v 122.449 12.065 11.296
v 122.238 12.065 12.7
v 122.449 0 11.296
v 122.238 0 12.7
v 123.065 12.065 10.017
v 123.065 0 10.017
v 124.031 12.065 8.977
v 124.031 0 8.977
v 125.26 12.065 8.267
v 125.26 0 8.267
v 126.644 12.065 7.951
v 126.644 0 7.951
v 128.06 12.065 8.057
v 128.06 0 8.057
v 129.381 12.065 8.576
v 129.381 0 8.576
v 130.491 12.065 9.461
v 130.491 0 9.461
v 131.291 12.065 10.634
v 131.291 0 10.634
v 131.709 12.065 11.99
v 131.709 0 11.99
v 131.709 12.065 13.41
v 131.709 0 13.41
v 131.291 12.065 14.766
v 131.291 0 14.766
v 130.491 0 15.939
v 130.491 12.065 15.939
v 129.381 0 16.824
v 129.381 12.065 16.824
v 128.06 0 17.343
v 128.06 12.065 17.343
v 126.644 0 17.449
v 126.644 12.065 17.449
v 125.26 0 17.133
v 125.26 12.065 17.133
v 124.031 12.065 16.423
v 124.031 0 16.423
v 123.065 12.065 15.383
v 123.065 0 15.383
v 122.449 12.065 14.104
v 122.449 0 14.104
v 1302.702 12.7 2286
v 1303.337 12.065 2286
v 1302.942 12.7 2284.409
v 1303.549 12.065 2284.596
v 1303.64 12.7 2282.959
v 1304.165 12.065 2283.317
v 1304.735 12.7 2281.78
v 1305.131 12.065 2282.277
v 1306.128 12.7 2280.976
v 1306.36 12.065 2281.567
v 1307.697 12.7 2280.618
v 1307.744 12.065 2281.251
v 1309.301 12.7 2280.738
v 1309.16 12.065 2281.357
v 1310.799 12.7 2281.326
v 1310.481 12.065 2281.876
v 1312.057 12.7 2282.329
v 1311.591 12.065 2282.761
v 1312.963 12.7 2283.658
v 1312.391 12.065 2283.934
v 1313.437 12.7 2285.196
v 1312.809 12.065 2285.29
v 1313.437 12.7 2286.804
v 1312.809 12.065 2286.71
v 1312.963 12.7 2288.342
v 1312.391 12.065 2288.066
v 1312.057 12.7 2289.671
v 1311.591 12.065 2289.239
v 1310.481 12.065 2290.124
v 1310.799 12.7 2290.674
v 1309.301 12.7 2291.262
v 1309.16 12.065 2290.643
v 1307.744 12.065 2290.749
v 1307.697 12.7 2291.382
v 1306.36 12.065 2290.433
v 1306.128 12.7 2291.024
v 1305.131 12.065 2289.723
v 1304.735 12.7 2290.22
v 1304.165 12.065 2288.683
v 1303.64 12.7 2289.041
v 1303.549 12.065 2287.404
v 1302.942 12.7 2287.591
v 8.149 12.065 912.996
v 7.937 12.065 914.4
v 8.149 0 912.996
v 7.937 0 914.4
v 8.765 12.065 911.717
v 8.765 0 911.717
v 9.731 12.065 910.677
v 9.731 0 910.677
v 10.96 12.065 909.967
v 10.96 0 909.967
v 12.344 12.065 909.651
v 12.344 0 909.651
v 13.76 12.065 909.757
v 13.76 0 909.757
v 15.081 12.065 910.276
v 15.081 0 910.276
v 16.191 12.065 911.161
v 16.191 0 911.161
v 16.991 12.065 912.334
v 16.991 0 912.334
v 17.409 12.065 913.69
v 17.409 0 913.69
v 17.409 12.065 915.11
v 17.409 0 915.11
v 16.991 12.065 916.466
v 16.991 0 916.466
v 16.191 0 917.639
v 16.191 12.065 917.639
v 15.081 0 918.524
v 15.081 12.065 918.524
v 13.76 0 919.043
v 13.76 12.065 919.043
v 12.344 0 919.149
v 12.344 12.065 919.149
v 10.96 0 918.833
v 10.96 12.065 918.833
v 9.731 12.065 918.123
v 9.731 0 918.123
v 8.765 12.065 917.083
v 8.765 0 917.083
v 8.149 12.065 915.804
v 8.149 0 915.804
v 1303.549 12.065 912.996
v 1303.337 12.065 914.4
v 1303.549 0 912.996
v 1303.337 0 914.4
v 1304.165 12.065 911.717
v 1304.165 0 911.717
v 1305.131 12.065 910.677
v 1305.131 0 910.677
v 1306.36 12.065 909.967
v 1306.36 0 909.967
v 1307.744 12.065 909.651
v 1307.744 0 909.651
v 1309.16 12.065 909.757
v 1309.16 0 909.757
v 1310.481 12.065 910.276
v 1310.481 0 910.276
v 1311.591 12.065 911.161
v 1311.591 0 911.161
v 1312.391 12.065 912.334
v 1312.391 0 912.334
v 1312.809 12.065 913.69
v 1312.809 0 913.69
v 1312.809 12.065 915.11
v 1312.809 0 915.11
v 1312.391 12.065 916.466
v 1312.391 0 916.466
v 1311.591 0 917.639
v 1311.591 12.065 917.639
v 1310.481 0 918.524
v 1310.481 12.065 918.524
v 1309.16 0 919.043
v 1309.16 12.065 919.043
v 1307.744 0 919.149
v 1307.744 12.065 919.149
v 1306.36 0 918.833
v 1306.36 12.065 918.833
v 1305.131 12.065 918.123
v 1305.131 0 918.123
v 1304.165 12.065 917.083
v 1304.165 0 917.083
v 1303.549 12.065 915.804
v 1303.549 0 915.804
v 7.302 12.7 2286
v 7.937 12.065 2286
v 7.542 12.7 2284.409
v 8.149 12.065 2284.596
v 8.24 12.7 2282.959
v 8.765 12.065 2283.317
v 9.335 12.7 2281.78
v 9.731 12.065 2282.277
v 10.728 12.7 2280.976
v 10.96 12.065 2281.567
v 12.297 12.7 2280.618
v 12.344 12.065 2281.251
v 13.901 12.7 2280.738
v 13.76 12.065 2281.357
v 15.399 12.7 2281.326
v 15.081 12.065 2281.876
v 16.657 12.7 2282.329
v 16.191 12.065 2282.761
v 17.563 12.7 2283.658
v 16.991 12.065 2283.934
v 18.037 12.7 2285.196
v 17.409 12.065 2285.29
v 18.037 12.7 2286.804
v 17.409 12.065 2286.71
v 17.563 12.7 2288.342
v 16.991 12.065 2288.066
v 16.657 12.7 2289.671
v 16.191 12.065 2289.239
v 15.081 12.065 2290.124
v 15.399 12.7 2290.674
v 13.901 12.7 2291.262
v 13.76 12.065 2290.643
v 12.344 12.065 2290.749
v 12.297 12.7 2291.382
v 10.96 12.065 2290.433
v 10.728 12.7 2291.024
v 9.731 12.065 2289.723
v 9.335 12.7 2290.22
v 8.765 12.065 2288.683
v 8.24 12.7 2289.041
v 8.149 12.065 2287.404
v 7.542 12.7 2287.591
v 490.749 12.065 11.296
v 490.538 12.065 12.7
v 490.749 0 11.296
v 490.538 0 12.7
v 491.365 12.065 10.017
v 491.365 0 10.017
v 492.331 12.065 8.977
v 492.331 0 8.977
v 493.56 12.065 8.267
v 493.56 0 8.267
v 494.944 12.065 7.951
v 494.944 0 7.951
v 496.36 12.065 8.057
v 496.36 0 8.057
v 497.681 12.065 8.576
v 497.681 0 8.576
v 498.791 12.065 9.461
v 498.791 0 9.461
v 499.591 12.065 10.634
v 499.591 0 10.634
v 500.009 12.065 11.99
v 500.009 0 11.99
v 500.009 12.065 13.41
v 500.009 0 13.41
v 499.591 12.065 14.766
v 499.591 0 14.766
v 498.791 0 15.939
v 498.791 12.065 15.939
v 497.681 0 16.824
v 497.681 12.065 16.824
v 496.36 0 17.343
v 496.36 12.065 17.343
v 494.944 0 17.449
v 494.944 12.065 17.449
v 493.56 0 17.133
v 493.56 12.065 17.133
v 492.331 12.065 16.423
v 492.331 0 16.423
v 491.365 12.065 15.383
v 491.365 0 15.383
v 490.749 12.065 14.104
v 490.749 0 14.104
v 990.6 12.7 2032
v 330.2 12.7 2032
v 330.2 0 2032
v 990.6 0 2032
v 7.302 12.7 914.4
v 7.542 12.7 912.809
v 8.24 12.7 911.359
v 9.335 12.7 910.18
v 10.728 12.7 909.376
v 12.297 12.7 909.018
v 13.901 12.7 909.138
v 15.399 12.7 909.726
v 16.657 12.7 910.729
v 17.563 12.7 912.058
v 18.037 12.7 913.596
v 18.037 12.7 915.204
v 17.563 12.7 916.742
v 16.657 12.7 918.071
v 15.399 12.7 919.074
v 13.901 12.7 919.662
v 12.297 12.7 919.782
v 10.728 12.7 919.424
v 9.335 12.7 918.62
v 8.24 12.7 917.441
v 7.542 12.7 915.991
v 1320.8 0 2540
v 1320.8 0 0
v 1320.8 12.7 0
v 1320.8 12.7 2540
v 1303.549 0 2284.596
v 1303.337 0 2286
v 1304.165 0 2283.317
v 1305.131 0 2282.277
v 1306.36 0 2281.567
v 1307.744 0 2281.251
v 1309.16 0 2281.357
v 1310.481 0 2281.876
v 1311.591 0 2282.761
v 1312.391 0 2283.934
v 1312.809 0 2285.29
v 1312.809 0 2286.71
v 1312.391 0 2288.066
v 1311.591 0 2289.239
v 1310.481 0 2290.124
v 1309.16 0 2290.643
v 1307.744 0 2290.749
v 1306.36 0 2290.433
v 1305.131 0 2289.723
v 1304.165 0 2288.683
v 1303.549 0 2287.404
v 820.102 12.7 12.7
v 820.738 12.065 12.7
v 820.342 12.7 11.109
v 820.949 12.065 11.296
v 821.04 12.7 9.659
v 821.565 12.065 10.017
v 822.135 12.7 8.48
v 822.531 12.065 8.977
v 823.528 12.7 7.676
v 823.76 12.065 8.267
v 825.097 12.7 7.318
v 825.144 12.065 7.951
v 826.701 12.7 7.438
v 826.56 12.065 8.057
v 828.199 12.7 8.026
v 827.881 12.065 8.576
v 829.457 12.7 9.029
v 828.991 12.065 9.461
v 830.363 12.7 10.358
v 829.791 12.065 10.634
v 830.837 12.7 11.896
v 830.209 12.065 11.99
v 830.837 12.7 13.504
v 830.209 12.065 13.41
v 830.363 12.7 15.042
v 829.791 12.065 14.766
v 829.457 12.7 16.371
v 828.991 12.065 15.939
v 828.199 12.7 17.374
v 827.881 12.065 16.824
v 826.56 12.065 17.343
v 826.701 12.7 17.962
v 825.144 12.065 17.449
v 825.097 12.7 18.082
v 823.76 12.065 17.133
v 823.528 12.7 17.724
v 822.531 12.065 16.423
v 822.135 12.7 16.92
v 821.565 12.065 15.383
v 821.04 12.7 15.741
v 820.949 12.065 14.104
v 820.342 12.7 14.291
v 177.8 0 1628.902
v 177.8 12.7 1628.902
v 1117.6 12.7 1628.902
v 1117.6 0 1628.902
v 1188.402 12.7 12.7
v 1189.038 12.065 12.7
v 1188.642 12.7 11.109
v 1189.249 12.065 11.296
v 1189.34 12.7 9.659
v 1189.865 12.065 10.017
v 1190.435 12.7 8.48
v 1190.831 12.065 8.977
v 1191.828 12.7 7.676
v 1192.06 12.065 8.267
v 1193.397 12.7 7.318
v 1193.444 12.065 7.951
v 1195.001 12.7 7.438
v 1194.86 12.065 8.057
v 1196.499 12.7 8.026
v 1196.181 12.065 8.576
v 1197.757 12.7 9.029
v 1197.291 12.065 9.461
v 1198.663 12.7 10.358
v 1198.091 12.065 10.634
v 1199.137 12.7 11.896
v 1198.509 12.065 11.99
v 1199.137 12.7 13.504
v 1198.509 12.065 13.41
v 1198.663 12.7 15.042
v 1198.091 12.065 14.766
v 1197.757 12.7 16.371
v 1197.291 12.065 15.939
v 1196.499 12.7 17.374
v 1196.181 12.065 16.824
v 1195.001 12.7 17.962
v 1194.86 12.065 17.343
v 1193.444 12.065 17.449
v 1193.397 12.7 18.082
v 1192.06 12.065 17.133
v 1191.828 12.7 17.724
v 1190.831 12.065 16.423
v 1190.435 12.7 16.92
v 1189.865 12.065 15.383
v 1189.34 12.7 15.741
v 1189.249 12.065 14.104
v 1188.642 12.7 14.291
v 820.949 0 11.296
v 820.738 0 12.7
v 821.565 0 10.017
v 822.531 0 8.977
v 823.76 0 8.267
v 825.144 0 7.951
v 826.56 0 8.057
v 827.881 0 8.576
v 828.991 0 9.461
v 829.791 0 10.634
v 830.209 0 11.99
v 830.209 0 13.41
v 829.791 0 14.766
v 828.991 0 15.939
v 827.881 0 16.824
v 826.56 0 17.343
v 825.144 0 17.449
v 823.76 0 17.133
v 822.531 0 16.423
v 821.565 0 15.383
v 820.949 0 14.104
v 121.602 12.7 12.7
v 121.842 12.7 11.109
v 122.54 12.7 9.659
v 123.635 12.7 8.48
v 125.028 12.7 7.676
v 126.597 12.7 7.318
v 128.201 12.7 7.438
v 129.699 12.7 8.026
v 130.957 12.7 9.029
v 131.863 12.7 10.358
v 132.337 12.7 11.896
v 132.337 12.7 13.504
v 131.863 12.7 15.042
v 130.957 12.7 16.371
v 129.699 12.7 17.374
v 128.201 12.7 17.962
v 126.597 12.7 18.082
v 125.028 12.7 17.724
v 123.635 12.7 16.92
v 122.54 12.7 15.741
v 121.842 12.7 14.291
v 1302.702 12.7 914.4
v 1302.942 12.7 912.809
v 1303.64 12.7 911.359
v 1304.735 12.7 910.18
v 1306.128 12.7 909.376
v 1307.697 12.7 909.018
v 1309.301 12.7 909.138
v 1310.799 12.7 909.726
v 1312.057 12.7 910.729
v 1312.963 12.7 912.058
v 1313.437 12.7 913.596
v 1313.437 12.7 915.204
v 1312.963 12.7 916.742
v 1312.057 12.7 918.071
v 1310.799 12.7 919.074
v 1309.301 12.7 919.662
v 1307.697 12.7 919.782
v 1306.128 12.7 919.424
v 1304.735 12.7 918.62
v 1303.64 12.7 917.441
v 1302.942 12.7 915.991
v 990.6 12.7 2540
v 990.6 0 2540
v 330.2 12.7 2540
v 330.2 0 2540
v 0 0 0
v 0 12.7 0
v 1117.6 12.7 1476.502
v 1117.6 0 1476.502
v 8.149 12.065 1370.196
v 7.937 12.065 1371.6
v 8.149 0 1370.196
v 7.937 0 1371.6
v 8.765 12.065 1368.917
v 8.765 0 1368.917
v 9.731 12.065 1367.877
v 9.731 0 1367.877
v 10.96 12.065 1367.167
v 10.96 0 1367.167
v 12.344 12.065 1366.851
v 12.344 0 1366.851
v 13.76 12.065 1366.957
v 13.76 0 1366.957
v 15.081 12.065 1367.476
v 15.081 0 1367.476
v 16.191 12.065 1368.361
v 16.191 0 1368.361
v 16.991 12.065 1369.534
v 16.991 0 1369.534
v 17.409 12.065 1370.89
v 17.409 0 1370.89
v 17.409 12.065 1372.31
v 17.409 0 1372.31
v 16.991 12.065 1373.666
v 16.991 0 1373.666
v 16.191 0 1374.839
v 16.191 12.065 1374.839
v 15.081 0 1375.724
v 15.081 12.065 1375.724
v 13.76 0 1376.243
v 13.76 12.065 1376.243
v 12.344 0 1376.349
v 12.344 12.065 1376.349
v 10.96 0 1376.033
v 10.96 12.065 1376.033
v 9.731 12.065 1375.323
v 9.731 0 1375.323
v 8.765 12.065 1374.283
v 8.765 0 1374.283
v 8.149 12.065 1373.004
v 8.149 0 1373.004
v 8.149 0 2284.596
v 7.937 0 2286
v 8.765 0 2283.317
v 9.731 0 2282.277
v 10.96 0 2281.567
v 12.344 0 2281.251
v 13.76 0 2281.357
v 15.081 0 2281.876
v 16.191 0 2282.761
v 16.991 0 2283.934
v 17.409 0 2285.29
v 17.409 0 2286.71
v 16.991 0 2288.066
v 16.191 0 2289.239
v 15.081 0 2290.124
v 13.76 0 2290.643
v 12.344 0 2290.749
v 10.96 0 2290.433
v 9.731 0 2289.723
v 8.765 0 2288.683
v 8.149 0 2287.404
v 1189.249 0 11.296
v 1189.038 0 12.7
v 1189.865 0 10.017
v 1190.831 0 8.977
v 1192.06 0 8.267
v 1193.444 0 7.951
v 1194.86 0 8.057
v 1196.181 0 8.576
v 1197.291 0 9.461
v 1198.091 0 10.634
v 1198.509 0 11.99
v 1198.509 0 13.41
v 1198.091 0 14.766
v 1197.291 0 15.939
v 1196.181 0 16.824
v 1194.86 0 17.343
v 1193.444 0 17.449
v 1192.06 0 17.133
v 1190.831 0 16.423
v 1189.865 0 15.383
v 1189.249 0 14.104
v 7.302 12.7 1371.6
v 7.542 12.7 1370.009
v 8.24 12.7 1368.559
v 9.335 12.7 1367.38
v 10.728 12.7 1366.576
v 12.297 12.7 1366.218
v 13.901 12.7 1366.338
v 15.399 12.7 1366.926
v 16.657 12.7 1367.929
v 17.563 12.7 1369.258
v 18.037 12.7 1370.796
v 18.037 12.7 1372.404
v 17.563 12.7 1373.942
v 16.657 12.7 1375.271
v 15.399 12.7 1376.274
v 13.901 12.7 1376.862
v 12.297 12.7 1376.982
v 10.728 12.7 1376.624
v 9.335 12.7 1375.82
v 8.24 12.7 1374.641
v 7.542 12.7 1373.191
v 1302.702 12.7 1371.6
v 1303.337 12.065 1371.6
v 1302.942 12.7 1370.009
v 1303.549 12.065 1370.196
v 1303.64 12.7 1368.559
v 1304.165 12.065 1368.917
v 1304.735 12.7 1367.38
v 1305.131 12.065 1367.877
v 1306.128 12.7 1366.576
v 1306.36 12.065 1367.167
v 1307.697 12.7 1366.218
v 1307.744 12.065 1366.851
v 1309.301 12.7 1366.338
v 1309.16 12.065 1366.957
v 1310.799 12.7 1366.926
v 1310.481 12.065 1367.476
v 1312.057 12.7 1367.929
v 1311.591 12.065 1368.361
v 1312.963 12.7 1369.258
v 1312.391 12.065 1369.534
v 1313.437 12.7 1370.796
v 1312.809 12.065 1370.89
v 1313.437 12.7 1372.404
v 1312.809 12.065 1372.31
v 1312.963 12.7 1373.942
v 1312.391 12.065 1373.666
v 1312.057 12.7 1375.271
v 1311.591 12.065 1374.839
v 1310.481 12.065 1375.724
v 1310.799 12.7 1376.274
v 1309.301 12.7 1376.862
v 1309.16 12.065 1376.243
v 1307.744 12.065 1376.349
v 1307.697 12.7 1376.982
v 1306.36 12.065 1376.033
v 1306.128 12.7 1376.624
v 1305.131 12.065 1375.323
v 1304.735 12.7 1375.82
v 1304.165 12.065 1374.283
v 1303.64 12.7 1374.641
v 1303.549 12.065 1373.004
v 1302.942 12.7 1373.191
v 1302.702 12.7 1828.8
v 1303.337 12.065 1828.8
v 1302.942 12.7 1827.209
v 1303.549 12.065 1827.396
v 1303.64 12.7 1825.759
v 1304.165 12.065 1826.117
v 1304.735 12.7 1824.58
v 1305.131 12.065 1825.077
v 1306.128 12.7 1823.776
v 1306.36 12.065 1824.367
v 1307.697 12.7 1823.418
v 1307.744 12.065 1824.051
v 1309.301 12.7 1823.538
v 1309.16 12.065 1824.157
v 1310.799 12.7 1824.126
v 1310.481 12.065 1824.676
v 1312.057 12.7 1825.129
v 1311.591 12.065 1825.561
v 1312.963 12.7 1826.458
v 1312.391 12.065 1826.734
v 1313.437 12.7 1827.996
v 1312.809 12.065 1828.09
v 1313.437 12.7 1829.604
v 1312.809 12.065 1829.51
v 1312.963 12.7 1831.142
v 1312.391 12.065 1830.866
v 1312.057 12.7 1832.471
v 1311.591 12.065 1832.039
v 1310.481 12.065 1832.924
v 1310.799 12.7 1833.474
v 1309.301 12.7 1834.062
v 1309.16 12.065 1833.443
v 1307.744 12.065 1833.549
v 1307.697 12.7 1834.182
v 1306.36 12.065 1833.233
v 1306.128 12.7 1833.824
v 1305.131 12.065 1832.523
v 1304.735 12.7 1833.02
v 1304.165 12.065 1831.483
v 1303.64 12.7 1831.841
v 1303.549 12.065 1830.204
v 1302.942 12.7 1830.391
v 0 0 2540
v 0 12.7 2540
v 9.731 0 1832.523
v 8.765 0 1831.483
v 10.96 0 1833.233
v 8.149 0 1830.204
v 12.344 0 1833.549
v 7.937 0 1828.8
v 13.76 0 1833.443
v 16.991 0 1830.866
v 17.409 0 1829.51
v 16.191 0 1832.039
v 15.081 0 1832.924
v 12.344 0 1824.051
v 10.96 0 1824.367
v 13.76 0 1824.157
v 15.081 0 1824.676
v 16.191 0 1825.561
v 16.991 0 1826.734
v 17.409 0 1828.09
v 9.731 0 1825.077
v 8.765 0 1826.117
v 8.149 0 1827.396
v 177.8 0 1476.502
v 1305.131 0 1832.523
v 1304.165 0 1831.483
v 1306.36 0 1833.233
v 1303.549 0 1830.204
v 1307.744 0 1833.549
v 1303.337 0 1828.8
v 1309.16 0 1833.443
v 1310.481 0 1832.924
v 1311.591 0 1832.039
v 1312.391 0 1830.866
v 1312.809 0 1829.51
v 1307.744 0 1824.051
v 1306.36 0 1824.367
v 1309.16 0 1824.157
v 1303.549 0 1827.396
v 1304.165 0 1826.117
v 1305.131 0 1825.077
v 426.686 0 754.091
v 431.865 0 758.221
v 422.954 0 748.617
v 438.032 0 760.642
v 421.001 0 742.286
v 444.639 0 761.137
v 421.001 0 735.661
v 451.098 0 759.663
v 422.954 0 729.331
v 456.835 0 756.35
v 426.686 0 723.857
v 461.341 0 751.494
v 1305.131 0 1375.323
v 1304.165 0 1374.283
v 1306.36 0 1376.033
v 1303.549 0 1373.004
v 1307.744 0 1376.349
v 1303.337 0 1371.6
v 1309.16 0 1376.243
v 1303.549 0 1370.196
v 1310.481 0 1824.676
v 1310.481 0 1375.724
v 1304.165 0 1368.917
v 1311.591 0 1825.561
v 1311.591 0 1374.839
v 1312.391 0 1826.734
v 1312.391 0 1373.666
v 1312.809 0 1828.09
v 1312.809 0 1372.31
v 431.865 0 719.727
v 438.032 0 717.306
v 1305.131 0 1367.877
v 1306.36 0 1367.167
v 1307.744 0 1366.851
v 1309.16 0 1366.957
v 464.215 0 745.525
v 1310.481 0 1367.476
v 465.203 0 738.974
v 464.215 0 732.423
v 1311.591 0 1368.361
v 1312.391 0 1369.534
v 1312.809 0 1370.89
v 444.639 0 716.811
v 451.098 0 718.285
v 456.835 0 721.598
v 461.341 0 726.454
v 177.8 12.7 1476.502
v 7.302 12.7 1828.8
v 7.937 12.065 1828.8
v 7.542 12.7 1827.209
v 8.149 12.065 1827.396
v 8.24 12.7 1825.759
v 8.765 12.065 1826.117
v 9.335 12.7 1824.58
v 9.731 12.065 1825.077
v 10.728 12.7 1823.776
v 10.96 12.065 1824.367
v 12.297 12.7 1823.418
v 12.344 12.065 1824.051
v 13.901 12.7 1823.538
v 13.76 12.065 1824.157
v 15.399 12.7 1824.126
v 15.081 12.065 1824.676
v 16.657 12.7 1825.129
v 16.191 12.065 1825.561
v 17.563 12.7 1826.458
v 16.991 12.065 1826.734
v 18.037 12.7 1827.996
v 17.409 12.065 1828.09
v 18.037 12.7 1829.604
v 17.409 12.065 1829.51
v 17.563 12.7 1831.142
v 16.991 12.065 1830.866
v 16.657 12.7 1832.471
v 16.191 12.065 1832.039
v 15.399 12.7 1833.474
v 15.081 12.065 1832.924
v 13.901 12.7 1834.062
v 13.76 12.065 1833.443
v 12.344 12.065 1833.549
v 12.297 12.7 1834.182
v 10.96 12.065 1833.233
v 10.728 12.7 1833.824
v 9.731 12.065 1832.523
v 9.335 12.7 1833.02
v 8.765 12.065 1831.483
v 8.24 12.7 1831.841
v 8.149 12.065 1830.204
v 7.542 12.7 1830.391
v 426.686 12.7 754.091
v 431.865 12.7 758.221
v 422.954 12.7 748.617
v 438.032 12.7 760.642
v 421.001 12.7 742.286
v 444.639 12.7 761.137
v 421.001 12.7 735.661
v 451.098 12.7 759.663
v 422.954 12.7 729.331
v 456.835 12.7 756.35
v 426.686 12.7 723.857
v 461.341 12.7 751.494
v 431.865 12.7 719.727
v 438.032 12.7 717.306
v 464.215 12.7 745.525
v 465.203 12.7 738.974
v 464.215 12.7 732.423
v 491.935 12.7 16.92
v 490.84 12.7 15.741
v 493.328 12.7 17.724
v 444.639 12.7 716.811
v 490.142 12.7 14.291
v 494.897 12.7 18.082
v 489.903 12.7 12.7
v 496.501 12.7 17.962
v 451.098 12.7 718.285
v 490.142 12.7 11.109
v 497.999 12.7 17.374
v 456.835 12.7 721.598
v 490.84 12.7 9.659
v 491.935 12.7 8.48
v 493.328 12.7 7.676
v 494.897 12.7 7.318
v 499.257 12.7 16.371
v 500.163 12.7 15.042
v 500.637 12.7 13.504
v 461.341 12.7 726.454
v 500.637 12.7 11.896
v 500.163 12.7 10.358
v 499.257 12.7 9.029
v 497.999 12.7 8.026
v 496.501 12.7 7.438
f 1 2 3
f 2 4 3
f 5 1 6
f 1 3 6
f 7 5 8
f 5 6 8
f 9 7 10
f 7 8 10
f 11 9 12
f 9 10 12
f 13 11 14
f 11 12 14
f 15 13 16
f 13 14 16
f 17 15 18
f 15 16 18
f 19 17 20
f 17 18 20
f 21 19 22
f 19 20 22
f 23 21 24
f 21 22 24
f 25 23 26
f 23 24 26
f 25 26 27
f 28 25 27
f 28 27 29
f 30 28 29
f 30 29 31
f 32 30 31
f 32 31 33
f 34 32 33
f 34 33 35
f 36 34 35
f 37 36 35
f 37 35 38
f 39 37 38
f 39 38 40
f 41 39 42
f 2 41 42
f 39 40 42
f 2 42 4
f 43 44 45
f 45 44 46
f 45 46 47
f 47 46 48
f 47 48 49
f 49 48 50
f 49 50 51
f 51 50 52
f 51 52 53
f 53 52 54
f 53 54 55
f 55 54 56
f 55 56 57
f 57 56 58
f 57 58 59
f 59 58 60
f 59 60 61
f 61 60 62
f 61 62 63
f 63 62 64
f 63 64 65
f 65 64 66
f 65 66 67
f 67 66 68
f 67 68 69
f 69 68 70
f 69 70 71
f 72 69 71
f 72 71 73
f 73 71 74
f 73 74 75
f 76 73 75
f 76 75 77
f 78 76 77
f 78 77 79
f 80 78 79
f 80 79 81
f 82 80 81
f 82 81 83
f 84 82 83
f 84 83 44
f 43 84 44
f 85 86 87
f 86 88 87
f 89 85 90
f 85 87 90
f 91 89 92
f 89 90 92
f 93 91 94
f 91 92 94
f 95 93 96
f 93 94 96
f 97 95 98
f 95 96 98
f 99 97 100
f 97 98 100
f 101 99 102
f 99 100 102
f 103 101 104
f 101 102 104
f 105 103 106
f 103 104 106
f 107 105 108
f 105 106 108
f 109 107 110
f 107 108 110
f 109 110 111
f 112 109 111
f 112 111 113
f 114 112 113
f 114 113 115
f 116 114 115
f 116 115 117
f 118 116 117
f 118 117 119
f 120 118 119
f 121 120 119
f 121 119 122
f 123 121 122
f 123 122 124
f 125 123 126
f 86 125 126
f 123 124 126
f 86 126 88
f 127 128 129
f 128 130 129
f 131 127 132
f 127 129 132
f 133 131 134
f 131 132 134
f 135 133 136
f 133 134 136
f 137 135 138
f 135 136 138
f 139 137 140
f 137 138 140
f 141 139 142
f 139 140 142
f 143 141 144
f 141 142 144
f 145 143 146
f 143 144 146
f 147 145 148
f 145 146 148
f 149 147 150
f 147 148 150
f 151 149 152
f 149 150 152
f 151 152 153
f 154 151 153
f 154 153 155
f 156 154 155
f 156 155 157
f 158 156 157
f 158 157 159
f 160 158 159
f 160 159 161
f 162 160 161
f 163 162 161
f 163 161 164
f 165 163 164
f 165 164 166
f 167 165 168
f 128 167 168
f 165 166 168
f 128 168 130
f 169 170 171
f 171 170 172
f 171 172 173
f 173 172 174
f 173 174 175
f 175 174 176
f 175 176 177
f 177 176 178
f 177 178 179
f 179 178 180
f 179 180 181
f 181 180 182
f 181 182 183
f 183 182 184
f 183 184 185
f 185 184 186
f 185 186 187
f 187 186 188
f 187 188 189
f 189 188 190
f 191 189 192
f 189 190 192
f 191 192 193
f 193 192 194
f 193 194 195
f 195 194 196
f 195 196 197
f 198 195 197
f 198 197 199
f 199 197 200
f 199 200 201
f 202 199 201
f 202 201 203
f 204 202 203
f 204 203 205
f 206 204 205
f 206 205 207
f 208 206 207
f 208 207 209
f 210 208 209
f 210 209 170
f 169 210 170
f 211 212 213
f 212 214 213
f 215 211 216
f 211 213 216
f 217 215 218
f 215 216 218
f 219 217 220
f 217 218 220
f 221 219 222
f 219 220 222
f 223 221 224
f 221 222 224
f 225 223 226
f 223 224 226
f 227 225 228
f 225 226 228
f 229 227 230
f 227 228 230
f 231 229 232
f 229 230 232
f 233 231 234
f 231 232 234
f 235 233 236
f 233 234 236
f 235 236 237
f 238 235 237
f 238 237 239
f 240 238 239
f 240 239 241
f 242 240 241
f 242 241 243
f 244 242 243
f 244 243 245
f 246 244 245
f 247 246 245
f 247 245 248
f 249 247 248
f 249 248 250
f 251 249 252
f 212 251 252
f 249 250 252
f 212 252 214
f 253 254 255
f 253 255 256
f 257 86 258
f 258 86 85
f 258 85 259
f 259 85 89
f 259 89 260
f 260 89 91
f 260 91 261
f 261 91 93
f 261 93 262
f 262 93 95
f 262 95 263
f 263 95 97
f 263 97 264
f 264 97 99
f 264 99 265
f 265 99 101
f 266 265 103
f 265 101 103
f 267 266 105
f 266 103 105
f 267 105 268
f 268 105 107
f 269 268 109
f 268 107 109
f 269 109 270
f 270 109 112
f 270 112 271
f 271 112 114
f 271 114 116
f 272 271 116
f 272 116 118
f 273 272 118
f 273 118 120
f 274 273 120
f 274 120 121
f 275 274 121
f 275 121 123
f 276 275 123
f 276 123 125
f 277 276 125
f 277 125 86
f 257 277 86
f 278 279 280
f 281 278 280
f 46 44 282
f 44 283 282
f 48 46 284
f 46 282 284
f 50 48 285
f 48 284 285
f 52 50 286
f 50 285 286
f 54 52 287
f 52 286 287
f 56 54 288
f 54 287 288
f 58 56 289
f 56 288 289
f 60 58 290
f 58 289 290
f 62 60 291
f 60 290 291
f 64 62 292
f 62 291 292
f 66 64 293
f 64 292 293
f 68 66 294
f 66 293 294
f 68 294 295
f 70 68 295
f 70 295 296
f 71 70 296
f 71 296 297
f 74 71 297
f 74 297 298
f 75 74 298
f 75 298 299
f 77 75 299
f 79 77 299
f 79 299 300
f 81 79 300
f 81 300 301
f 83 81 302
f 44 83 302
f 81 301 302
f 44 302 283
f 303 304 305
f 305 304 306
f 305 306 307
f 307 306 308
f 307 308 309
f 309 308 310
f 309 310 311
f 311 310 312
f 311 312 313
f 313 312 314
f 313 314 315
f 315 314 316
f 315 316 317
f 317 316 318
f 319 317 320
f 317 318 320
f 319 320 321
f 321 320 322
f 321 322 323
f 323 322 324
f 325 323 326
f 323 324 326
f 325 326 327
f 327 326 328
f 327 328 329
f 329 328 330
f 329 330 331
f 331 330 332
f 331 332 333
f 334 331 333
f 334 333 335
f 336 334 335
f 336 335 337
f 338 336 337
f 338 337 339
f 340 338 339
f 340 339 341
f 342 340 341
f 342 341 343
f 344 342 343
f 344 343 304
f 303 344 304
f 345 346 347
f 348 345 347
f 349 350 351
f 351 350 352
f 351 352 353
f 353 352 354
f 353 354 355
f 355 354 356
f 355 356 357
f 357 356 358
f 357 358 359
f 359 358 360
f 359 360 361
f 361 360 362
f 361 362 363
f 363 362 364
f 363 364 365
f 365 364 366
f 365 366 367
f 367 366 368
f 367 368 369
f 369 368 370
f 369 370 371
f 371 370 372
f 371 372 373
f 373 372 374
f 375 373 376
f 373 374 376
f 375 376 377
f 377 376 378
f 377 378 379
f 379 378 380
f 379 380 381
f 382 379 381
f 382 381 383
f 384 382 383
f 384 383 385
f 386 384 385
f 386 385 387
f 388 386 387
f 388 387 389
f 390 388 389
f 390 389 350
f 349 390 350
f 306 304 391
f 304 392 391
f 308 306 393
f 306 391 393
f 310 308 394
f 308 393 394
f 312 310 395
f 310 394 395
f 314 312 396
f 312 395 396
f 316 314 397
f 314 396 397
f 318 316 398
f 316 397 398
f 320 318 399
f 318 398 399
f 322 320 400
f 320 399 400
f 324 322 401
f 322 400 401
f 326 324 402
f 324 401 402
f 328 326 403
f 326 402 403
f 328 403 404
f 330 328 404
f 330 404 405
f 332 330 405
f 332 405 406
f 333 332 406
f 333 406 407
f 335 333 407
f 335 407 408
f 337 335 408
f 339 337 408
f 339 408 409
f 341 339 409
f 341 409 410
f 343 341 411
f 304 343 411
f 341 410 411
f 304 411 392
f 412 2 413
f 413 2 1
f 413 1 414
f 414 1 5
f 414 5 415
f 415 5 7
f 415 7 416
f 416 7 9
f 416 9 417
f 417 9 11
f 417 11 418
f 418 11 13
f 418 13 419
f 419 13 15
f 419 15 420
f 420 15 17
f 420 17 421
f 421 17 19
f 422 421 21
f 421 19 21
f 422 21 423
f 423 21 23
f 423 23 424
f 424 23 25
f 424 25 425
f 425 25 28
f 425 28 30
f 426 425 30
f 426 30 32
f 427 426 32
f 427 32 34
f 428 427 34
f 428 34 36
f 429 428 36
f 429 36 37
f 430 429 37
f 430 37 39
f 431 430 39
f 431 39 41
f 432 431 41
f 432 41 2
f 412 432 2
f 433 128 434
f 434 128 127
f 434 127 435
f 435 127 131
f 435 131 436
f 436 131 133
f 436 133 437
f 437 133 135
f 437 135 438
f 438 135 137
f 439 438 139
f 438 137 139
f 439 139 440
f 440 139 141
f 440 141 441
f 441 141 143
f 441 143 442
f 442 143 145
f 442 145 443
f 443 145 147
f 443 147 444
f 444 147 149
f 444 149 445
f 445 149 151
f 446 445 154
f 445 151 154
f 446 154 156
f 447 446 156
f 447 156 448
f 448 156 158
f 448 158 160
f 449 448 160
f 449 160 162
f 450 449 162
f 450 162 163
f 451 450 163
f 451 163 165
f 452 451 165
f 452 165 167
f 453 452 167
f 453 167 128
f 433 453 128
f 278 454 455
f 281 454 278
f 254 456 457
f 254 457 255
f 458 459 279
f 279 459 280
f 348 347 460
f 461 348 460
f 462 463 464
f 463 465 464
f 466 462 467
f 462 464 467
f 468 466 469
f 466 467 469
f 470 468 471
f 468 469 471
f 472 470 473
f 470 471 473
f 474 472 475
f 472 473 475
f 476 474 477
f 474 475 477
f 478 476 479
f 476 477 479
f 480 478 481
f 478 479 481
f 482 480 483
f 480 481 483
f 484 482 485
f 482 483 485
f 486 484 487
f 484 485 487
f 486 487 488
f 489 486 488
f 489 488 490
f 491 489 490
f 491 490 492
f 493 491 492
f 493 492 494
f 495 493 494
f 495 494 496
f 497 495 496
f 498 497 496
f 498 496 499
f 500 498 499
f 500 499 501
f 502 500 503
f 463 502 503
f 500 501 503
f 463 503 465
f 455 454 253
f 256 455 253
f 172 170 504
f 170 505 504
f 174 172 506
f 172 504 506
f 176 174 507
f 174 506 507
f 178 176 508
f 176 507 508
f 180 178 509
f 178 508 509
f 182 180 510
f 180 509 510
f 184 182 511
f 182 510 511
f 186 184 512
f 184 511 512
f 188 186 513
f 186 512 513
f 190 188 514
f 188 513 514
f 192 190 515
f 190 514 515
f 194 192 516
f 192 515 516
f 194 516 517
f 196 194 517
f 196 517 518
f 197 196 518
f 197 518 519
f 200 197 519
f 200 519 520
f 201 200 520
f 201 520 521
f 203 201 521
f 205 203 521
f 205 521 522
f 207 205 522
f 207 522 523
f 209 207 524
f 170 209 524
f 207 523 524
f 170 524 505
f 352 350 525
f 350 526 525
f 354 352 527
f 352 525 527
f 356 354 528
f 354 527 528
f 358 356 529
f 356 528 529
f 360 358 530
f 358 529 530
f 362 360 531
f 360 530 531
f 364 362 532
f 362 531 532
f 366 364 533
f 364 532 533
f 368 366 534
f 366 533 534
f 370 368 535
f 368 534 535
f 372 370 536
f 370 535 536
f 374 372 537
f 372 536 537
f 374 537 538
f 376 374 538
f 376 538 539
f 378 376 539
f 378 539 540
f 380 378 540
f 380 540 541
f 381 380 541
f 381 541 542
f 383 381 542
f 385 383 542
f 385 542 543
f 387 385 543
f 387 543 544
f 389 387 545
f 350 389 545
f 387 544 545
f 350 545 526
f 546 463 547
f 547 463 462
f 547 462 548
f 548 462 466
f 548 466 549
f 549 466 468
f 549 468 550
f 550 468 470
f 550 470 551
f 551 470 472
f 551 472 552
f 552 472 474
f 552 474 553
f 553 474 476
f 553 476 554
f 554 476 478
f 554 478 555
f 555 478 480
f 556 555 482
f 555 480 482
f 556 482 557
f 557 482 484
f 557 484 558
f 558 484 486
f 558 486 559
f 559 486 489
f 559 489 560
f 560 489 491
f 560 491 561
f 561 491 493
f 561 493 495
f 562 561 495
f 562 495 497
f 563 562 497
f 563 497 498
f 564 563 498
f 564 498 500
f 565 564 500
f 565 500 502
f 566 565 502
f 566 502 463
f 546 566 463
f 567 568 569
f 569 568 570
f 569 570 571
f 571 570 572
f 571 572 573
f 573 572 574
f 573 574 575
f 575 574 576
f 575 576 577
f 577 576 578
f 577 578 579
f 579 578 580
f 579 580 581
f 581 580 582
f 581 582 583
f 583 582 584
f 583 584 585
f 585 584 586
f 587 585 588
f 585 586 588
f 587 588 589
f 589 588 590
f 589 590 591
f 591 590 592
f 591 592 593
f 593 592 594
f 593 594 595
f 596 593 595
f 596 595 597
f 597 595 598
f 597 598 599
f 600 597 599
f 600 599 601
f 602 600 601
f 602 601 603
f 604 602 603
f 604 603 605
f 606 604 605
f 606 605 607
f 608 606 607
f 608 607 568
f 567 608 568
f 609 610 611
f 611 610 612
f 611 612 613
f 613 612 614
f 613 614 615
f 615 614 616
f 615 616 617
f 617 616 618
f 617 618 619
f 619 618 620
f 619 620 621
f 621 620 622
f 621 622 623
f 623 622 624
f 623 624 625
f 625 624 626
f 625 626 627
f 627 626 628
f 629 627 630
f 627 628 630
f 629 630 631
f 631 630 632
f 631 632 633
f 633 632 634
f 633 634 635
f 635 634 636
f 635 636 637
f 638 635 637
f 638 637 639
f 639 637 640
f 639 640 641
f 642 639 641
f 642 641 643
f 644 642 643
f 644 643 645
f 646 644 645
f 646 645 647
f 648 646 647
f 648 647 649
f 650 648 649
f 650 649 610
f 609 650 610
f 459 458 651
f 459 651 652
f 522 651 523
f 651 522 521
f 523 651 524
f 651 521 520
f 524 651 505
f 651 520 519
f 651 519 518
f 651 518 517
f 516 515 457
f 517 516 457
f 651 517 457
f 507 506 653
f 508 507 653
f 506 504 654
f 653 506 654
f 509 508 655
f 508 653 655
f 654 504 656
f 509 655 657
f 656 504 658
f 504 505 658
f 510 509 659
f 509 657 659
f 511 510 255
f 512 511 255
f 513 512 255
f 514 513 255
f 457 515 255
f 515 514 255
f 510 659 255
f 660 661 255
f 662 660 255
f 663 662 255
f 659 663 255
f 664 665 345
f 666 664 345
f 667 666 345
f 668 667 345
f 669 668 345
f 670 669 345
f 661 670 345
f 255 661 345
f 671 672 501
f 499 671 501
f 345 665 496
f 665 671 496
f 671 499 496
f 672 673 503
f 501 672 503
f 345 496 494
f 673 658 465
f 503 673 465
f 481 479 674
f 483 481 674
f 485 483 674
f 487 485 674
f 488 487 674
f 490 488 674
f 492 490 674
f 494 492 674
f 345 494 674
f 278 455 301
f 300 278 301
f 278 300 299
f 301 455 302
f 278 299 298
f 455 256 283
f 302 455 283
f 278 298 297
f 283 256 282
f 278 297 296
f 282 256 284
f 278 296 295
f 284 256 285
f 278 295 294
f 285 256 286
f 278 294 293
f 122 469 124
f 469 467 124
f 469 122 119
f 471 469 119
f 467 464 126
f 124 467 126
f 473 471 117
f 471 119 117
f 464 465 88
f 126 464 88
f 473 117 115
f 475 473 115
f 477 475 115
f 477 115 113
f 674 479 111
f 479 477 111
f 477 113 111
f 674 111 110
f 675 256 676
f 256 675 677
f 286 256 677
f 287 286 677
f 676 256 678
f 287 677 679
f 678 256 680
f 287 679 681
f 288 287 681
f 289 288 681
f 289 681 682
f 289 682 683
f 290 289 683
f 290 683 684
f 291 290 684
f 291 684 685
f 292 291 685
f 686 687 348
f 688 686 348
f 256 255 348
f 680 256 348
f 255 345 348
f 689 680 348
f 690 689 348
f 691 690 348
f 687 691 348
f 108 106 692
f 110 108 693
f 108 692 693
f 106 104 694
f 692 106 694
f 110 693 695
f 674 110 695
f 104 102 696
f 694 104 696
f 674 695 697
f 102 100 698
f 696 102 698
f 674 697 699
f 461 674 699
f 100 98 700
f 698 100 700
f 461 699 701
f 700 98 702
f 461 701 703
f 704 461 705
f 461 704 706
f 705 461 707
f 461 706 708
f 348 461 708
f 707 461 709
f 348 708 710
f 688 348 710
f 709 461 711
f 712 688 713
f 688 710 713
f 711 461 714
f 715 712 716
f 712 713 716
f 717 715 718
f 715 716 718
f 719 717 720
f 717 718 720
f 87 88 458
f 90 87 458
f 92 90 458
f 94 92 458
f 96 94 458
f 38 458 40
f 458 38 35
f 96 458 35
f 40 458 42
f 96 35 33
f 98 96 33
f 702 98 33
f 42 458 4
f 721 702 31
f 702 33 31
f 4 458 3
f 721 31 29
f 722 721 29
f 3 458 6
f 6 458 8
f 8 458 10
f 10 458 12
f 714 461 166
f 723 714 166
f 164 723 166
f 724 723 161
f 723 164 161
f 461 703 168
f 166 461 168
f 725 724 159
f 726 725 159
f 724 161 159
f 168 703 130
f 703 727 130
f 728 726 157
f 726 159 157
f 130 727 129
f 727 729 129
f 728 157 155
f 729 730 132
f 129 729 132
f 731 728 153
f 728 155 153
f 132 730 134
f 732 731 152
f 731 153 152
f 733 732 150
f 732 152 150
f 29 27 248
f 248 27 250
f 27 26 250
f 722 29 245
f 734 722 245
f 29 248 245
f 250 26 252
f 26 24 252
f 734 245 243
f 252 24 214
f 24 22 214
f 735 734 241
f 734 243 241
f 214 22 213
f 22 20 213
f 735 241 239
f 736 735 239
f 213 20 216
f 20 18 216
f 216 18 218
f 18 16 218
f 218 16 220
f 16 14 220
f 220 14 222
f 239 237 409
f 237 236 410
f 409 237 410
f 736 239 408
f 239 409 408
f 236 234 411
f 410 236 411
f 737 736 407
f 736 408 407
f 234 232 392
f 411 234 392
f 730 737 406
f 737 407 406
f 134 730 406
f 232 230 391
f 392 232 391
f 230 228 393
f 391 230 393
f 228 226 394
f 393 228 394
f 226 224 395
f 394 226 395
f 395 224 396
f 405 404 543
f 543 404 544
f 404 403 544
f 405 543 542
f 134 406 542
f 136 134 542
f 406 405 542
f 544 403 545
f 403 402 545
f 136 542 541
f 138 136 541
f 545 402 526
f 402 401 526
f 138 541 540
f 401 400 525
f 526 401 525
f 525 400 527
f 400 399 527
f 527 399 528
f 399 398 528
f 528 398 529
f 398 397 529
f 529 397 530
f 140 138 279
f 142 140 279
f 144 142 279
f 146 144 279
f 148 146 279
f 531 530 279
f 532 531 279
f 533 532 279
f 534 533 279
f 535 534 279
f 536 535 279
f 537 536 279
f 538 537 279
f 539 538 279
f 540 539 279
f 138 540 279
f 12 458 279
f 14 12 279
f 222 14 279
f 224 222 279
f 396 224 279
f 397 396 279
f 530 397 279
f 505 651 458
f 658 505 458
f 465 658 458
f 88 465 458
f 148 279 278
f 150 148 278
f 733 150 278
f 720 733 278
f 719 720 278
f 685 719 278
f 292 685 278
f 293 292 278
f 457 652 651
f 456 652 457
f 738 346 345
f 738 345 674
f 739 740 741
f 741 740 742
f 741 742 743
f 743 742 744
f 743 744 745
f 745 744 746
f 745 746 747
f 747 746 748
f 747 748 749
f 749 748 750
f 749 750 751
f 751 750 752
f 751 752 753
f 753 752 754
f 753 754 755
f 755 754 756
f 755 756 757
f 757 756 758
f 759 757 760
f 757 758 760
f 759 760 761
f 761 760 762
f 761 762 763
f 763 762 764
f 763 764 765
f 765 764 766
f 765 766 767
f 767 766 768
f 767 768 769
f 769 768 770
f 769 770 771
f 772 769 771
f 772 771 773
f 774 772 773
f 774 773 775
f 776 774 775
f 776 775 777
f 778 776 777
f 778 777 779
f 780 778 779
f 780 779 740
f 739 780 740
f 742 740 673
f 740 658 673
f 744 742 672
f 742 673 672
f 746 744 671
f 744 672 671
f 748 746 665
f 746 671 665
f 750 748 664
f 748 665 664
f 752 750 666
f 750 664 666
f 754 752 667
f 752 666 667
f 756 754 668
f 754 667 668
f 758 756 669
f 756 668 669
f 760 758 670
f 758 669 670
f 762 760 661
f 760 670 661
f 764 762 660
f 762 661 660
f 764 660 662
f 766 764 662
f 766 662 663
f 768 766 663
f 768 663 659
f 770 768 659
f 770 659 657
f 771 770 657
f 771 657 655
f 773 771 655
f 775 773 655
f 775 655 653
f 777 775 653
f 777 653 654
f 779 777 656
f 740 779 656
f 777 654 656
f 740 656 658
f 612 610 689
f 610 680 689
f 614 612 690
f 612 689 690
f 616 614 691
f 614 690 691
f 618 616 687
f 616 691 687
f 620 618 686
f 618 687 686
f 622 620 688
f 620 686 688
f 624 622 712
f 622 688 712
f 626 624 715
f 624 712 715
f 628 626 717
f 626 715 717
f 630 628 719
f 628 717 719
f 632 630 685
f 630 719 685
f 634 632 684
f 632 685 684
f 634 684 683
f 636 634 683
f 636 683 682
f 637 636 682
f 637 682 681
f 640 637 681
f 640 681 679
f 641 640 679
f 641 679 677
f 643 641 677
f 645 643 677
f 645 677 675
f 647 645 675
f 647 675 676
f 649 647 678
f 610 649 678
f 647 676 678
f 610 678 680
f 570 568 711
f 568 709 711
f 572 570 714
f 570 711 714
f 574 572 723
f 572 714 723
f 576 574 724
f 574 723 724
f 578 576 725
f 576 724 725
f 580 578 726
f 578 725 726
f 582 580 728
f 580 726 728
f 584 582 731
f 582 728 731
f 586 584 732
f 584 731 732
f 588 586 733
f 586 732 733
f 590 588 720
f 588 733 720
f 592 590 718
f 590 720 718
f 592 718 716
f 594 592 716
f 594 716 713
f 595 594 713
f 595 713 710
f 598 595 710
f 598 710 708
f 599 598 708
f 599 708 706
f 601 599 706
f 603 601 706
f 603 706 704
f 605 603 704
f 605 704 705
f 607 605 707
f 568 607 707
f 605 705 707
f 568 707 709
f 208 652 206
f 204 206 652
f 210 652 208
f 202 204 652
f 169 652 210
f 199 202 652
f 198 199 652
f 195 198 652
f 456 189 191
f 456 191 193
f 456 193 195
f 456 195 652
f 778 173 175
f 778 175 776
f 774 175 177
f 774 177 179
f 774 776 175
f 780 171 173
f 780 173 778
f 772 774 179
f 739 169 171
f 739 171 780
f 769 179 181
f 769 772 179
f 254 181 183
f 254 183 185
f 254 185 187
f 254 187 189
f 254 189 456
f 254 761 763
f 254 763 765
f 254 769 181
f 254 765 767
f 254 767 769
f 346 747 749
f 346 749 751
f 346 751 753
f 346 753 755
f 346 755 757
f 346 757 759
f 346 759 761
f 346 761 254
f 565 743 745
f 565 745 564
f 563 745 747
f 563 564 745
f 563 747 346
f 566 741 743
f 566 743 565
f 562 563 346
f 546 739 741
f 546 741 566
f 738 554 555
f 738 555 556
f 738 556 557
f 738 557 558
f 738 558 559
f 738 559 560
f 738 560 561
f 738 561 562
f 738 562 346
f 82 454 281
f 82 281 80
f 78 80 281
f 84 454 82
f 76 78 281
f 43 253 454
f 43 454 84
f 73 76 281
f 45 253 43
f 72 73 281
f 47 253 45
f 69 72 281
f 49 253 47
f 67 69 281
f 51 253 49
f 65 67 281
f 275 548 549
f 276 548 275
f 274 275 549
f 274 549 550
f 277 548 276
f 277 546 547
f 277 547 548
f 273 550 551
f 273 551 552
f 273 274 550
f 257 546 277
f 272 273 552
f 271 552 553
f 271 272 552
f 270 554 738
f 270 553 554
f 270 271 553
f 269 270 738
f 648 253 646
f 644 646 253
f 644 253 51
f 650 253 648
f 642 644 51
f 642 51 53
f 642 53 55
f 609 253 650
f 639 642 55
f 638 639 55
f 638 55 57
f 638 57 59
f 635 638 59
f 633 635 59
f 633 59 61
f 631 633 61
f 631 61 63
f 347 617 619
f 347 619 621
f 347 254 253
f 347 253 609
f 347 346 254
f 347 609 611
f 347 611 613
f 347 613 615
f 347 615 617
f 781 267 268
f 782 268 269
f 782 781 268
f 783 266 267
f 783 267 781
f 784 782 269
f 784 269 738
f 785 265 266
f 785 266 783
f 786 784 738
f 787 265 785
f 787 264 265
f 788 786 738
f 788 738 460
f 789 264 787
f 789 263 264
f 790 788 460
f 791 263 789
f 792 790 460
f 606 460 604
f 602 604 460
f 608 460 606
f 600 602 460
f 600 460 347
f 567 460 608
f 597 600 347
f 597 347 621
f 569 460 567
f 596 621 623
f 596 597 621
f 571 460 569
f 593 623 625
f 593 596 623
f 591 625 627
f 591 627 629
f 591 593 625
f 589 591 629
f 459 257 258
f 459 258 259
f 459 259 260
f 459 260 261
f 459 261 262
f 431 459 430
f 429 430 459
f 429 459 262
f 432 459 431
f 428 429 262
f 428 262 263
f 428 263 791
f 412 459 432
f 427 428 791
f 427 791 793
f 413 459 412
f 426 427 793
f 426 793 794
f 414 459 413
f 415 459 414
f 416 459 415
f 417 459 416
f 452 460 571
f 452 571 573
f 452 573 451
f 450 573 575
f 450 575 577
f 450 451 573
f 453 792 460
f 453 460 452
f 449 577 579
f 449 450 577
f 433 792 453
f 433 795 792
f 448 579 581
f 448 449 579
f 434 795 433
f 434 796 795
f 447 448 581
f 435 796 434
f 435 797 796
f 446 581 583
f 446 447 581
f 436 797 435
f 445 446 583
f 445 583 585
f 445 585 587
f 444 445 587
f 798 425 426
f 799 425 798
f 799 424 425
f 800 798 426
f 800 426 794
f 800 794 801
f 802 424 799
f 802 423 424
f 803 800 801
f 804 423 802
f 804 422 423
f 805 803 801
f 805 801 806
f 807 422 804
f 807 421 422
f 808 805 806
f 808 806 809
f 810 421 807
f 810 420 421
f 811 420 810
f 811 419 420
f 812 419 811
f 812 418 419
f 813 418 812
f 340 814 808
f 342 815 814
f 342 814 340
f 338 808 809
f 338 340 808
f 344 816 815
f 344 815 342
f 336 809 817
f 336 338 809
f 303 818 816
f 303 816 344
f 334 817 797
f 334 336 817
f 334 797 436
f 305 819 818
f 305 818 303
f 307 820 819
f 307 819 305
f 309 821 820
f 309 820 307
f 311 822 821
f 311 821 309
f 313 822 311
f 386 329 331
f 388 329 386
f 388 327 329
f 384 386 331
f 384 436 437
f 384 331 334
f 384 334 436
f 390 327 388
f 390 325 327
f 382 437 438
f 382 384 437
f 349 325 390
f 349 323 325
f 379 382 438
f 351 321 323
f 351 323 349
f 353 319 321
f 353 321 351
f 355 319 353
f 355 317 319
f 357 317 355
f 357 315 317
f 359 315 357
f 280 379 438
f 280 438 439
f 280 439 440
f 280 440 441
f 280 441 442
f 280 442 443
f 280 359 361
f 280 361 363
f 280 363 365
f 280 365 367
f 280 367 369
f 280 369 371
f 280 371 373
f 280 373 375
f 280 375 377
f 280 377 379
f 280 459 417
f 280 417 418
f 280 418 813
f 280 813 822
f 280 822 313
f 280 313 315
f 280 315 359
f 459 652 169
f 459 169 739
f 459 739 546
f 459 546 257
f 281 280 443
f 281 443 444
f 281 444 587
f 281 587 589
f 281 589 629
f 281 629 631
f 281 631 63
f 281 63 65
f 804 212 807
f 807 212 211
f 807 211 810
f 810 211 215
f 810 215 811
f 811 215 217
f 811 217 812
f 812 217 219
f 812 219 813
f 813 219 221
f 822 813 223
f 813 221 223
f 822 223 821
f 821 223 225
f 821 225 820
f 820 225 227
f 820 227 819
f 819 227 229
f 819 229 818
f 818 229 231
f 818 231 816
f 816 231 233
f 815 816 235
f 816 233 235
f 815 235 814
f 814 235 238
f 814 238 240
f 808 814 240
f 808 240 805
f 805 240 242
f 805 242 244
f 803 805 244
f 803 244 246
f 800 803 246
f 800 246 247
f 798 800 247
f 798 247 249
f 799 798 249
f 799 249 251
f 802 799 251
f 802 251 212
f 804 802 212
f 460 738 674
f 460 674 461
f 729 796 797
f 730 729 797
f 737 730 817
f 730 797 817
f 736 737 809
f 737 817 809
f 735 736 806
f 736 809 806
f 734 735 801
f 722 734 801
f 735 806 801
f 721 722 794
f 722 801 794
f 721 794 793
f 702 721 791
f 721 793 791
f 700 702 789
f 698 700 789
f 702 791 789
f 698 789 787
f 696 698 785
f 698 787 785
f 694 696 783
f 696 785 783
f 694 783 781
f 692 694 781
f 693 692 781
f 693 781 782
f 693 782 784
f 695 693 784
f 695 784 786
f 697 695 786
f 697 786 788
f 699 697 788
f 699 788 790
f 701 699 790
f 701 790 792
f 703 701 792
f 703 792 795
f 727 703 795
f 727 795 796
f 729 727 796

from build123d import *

# Parameters (mm, degrees)
SKETCH1_W                              = 1320.8
SKETCH1_H                              = 12.7
BOSS_EXTRUDE1_DEPTH                    = 2540
SKETCH2_W                              = 660.4
SKETCH2_H                              = 508
CUT_EXTRUDE1_DEPTH                     = 13.7
F_3_8_0_375_DIAMETER_HOLE1_D           = 9.525
F_3_8_0_375_DIAMETER_HOLE1_CSINK_D     = 10.795
F_3_8_0_375_DIAMETER_HOLE1_CSINK_ANGLE = 90
SKETCH5_W                              = 939.8
SKETCH5_H                              = 152.4
CUT_EXTRUDE3_DEPTH                     = 1
CUT_EXTRUDE3_DEPTH_BACK                = 13.7
SKETCH6_R                              = 22.225
CUT_EXTRUDE4_DEPTH                     = 31.75


with BuildPart() as part:
    # Sketch1 → Boss-Extrude1 (new body)
    with BuildSketch(Plane.XY):
        with Locations((660.4, 6.35)):
            Rectangle(SKETCH1_W, SKETCH1_H)
    extrude(amount=BOSS_EXTRUDE1_DEPTH)

    # Sketch2 → Cut-Extrude1 (cut, through all)
    with BuildSketch(Plane(origin=(0, 12.7, 0), x_dir=(1, 0, 0), z_dir=(0, 1, 0))):
        with Locations((660.4, -2286)):
            Rectangle(SKETCH2_W, SKETCH2_H)
    extrude(amount=-CUT_EXTRUDE1_DEPTH, mode=Mode.SUBTRACT)

    # 3/8 (0.375) Diameter Hole1 (through all)
    with Locations(Plane(origin=(0, 12.7, 0), x_dir=(1, 0, 0), z_dir=(0, 1, 0))):
        with Locations((1308.1, -2286), (1308.1, -1828.8), (1308.1, -1371.6), (1308.1, -914.4), (12.7, -2286), (12.7, -1828.8), (12.7, -1371.6), (12.7, -914.4), (495.3, -12.7), (127, -12.7), (1193.8, -12.7), (825.5, -12.7)):
            CounterSinkHole(F_3_8_0_375_DIAMETER_HOLE1_D / 2, F_3_8_0_375_DIAMETER_HOLE1_CSINK_D / 2, counter_sink_angle=F_3_8_0_375_DIAMETER_HOLE1_CSINK_ANGLE)

    # Sketch5 → Cut-Extrude3 (cut, two sides)
    with BuildSketch(Plane(origin=(0, 12.7, 0), x_dir=(1, 0, 0), z_dir=(0, 1, 0))) as cut_extrude3_sk:
        with Locations((647.7, -1552.702)):
            Rectangle(SKETCH5_W, SKETCH5_H)
    extrude(amount=CUT_EXTRUDE3_DEPTH, mode=Mode.SUBTRACT)
    extrude(cut_extrude3_sk.sketch, amount=-CUT_EXTRUDE3_DEPTH_BACK, mode=Mode.SUBTRACT)

    # Sketch6 → Cut-Extrude4 (cut)
    with BuildSketch(Plane(origin=(0, 12.7, 0), x_dir=(1, 0, 0), z_dir=(0, 1, 0))):
        with Locations((442.97784899, -738.973935122)):
            Circle(SKETCH6_R)
    extrude(amount=-CUT_EXTRUDE4_DEPTH, mode=Mode.SUBTRACT)


solid = part.part
